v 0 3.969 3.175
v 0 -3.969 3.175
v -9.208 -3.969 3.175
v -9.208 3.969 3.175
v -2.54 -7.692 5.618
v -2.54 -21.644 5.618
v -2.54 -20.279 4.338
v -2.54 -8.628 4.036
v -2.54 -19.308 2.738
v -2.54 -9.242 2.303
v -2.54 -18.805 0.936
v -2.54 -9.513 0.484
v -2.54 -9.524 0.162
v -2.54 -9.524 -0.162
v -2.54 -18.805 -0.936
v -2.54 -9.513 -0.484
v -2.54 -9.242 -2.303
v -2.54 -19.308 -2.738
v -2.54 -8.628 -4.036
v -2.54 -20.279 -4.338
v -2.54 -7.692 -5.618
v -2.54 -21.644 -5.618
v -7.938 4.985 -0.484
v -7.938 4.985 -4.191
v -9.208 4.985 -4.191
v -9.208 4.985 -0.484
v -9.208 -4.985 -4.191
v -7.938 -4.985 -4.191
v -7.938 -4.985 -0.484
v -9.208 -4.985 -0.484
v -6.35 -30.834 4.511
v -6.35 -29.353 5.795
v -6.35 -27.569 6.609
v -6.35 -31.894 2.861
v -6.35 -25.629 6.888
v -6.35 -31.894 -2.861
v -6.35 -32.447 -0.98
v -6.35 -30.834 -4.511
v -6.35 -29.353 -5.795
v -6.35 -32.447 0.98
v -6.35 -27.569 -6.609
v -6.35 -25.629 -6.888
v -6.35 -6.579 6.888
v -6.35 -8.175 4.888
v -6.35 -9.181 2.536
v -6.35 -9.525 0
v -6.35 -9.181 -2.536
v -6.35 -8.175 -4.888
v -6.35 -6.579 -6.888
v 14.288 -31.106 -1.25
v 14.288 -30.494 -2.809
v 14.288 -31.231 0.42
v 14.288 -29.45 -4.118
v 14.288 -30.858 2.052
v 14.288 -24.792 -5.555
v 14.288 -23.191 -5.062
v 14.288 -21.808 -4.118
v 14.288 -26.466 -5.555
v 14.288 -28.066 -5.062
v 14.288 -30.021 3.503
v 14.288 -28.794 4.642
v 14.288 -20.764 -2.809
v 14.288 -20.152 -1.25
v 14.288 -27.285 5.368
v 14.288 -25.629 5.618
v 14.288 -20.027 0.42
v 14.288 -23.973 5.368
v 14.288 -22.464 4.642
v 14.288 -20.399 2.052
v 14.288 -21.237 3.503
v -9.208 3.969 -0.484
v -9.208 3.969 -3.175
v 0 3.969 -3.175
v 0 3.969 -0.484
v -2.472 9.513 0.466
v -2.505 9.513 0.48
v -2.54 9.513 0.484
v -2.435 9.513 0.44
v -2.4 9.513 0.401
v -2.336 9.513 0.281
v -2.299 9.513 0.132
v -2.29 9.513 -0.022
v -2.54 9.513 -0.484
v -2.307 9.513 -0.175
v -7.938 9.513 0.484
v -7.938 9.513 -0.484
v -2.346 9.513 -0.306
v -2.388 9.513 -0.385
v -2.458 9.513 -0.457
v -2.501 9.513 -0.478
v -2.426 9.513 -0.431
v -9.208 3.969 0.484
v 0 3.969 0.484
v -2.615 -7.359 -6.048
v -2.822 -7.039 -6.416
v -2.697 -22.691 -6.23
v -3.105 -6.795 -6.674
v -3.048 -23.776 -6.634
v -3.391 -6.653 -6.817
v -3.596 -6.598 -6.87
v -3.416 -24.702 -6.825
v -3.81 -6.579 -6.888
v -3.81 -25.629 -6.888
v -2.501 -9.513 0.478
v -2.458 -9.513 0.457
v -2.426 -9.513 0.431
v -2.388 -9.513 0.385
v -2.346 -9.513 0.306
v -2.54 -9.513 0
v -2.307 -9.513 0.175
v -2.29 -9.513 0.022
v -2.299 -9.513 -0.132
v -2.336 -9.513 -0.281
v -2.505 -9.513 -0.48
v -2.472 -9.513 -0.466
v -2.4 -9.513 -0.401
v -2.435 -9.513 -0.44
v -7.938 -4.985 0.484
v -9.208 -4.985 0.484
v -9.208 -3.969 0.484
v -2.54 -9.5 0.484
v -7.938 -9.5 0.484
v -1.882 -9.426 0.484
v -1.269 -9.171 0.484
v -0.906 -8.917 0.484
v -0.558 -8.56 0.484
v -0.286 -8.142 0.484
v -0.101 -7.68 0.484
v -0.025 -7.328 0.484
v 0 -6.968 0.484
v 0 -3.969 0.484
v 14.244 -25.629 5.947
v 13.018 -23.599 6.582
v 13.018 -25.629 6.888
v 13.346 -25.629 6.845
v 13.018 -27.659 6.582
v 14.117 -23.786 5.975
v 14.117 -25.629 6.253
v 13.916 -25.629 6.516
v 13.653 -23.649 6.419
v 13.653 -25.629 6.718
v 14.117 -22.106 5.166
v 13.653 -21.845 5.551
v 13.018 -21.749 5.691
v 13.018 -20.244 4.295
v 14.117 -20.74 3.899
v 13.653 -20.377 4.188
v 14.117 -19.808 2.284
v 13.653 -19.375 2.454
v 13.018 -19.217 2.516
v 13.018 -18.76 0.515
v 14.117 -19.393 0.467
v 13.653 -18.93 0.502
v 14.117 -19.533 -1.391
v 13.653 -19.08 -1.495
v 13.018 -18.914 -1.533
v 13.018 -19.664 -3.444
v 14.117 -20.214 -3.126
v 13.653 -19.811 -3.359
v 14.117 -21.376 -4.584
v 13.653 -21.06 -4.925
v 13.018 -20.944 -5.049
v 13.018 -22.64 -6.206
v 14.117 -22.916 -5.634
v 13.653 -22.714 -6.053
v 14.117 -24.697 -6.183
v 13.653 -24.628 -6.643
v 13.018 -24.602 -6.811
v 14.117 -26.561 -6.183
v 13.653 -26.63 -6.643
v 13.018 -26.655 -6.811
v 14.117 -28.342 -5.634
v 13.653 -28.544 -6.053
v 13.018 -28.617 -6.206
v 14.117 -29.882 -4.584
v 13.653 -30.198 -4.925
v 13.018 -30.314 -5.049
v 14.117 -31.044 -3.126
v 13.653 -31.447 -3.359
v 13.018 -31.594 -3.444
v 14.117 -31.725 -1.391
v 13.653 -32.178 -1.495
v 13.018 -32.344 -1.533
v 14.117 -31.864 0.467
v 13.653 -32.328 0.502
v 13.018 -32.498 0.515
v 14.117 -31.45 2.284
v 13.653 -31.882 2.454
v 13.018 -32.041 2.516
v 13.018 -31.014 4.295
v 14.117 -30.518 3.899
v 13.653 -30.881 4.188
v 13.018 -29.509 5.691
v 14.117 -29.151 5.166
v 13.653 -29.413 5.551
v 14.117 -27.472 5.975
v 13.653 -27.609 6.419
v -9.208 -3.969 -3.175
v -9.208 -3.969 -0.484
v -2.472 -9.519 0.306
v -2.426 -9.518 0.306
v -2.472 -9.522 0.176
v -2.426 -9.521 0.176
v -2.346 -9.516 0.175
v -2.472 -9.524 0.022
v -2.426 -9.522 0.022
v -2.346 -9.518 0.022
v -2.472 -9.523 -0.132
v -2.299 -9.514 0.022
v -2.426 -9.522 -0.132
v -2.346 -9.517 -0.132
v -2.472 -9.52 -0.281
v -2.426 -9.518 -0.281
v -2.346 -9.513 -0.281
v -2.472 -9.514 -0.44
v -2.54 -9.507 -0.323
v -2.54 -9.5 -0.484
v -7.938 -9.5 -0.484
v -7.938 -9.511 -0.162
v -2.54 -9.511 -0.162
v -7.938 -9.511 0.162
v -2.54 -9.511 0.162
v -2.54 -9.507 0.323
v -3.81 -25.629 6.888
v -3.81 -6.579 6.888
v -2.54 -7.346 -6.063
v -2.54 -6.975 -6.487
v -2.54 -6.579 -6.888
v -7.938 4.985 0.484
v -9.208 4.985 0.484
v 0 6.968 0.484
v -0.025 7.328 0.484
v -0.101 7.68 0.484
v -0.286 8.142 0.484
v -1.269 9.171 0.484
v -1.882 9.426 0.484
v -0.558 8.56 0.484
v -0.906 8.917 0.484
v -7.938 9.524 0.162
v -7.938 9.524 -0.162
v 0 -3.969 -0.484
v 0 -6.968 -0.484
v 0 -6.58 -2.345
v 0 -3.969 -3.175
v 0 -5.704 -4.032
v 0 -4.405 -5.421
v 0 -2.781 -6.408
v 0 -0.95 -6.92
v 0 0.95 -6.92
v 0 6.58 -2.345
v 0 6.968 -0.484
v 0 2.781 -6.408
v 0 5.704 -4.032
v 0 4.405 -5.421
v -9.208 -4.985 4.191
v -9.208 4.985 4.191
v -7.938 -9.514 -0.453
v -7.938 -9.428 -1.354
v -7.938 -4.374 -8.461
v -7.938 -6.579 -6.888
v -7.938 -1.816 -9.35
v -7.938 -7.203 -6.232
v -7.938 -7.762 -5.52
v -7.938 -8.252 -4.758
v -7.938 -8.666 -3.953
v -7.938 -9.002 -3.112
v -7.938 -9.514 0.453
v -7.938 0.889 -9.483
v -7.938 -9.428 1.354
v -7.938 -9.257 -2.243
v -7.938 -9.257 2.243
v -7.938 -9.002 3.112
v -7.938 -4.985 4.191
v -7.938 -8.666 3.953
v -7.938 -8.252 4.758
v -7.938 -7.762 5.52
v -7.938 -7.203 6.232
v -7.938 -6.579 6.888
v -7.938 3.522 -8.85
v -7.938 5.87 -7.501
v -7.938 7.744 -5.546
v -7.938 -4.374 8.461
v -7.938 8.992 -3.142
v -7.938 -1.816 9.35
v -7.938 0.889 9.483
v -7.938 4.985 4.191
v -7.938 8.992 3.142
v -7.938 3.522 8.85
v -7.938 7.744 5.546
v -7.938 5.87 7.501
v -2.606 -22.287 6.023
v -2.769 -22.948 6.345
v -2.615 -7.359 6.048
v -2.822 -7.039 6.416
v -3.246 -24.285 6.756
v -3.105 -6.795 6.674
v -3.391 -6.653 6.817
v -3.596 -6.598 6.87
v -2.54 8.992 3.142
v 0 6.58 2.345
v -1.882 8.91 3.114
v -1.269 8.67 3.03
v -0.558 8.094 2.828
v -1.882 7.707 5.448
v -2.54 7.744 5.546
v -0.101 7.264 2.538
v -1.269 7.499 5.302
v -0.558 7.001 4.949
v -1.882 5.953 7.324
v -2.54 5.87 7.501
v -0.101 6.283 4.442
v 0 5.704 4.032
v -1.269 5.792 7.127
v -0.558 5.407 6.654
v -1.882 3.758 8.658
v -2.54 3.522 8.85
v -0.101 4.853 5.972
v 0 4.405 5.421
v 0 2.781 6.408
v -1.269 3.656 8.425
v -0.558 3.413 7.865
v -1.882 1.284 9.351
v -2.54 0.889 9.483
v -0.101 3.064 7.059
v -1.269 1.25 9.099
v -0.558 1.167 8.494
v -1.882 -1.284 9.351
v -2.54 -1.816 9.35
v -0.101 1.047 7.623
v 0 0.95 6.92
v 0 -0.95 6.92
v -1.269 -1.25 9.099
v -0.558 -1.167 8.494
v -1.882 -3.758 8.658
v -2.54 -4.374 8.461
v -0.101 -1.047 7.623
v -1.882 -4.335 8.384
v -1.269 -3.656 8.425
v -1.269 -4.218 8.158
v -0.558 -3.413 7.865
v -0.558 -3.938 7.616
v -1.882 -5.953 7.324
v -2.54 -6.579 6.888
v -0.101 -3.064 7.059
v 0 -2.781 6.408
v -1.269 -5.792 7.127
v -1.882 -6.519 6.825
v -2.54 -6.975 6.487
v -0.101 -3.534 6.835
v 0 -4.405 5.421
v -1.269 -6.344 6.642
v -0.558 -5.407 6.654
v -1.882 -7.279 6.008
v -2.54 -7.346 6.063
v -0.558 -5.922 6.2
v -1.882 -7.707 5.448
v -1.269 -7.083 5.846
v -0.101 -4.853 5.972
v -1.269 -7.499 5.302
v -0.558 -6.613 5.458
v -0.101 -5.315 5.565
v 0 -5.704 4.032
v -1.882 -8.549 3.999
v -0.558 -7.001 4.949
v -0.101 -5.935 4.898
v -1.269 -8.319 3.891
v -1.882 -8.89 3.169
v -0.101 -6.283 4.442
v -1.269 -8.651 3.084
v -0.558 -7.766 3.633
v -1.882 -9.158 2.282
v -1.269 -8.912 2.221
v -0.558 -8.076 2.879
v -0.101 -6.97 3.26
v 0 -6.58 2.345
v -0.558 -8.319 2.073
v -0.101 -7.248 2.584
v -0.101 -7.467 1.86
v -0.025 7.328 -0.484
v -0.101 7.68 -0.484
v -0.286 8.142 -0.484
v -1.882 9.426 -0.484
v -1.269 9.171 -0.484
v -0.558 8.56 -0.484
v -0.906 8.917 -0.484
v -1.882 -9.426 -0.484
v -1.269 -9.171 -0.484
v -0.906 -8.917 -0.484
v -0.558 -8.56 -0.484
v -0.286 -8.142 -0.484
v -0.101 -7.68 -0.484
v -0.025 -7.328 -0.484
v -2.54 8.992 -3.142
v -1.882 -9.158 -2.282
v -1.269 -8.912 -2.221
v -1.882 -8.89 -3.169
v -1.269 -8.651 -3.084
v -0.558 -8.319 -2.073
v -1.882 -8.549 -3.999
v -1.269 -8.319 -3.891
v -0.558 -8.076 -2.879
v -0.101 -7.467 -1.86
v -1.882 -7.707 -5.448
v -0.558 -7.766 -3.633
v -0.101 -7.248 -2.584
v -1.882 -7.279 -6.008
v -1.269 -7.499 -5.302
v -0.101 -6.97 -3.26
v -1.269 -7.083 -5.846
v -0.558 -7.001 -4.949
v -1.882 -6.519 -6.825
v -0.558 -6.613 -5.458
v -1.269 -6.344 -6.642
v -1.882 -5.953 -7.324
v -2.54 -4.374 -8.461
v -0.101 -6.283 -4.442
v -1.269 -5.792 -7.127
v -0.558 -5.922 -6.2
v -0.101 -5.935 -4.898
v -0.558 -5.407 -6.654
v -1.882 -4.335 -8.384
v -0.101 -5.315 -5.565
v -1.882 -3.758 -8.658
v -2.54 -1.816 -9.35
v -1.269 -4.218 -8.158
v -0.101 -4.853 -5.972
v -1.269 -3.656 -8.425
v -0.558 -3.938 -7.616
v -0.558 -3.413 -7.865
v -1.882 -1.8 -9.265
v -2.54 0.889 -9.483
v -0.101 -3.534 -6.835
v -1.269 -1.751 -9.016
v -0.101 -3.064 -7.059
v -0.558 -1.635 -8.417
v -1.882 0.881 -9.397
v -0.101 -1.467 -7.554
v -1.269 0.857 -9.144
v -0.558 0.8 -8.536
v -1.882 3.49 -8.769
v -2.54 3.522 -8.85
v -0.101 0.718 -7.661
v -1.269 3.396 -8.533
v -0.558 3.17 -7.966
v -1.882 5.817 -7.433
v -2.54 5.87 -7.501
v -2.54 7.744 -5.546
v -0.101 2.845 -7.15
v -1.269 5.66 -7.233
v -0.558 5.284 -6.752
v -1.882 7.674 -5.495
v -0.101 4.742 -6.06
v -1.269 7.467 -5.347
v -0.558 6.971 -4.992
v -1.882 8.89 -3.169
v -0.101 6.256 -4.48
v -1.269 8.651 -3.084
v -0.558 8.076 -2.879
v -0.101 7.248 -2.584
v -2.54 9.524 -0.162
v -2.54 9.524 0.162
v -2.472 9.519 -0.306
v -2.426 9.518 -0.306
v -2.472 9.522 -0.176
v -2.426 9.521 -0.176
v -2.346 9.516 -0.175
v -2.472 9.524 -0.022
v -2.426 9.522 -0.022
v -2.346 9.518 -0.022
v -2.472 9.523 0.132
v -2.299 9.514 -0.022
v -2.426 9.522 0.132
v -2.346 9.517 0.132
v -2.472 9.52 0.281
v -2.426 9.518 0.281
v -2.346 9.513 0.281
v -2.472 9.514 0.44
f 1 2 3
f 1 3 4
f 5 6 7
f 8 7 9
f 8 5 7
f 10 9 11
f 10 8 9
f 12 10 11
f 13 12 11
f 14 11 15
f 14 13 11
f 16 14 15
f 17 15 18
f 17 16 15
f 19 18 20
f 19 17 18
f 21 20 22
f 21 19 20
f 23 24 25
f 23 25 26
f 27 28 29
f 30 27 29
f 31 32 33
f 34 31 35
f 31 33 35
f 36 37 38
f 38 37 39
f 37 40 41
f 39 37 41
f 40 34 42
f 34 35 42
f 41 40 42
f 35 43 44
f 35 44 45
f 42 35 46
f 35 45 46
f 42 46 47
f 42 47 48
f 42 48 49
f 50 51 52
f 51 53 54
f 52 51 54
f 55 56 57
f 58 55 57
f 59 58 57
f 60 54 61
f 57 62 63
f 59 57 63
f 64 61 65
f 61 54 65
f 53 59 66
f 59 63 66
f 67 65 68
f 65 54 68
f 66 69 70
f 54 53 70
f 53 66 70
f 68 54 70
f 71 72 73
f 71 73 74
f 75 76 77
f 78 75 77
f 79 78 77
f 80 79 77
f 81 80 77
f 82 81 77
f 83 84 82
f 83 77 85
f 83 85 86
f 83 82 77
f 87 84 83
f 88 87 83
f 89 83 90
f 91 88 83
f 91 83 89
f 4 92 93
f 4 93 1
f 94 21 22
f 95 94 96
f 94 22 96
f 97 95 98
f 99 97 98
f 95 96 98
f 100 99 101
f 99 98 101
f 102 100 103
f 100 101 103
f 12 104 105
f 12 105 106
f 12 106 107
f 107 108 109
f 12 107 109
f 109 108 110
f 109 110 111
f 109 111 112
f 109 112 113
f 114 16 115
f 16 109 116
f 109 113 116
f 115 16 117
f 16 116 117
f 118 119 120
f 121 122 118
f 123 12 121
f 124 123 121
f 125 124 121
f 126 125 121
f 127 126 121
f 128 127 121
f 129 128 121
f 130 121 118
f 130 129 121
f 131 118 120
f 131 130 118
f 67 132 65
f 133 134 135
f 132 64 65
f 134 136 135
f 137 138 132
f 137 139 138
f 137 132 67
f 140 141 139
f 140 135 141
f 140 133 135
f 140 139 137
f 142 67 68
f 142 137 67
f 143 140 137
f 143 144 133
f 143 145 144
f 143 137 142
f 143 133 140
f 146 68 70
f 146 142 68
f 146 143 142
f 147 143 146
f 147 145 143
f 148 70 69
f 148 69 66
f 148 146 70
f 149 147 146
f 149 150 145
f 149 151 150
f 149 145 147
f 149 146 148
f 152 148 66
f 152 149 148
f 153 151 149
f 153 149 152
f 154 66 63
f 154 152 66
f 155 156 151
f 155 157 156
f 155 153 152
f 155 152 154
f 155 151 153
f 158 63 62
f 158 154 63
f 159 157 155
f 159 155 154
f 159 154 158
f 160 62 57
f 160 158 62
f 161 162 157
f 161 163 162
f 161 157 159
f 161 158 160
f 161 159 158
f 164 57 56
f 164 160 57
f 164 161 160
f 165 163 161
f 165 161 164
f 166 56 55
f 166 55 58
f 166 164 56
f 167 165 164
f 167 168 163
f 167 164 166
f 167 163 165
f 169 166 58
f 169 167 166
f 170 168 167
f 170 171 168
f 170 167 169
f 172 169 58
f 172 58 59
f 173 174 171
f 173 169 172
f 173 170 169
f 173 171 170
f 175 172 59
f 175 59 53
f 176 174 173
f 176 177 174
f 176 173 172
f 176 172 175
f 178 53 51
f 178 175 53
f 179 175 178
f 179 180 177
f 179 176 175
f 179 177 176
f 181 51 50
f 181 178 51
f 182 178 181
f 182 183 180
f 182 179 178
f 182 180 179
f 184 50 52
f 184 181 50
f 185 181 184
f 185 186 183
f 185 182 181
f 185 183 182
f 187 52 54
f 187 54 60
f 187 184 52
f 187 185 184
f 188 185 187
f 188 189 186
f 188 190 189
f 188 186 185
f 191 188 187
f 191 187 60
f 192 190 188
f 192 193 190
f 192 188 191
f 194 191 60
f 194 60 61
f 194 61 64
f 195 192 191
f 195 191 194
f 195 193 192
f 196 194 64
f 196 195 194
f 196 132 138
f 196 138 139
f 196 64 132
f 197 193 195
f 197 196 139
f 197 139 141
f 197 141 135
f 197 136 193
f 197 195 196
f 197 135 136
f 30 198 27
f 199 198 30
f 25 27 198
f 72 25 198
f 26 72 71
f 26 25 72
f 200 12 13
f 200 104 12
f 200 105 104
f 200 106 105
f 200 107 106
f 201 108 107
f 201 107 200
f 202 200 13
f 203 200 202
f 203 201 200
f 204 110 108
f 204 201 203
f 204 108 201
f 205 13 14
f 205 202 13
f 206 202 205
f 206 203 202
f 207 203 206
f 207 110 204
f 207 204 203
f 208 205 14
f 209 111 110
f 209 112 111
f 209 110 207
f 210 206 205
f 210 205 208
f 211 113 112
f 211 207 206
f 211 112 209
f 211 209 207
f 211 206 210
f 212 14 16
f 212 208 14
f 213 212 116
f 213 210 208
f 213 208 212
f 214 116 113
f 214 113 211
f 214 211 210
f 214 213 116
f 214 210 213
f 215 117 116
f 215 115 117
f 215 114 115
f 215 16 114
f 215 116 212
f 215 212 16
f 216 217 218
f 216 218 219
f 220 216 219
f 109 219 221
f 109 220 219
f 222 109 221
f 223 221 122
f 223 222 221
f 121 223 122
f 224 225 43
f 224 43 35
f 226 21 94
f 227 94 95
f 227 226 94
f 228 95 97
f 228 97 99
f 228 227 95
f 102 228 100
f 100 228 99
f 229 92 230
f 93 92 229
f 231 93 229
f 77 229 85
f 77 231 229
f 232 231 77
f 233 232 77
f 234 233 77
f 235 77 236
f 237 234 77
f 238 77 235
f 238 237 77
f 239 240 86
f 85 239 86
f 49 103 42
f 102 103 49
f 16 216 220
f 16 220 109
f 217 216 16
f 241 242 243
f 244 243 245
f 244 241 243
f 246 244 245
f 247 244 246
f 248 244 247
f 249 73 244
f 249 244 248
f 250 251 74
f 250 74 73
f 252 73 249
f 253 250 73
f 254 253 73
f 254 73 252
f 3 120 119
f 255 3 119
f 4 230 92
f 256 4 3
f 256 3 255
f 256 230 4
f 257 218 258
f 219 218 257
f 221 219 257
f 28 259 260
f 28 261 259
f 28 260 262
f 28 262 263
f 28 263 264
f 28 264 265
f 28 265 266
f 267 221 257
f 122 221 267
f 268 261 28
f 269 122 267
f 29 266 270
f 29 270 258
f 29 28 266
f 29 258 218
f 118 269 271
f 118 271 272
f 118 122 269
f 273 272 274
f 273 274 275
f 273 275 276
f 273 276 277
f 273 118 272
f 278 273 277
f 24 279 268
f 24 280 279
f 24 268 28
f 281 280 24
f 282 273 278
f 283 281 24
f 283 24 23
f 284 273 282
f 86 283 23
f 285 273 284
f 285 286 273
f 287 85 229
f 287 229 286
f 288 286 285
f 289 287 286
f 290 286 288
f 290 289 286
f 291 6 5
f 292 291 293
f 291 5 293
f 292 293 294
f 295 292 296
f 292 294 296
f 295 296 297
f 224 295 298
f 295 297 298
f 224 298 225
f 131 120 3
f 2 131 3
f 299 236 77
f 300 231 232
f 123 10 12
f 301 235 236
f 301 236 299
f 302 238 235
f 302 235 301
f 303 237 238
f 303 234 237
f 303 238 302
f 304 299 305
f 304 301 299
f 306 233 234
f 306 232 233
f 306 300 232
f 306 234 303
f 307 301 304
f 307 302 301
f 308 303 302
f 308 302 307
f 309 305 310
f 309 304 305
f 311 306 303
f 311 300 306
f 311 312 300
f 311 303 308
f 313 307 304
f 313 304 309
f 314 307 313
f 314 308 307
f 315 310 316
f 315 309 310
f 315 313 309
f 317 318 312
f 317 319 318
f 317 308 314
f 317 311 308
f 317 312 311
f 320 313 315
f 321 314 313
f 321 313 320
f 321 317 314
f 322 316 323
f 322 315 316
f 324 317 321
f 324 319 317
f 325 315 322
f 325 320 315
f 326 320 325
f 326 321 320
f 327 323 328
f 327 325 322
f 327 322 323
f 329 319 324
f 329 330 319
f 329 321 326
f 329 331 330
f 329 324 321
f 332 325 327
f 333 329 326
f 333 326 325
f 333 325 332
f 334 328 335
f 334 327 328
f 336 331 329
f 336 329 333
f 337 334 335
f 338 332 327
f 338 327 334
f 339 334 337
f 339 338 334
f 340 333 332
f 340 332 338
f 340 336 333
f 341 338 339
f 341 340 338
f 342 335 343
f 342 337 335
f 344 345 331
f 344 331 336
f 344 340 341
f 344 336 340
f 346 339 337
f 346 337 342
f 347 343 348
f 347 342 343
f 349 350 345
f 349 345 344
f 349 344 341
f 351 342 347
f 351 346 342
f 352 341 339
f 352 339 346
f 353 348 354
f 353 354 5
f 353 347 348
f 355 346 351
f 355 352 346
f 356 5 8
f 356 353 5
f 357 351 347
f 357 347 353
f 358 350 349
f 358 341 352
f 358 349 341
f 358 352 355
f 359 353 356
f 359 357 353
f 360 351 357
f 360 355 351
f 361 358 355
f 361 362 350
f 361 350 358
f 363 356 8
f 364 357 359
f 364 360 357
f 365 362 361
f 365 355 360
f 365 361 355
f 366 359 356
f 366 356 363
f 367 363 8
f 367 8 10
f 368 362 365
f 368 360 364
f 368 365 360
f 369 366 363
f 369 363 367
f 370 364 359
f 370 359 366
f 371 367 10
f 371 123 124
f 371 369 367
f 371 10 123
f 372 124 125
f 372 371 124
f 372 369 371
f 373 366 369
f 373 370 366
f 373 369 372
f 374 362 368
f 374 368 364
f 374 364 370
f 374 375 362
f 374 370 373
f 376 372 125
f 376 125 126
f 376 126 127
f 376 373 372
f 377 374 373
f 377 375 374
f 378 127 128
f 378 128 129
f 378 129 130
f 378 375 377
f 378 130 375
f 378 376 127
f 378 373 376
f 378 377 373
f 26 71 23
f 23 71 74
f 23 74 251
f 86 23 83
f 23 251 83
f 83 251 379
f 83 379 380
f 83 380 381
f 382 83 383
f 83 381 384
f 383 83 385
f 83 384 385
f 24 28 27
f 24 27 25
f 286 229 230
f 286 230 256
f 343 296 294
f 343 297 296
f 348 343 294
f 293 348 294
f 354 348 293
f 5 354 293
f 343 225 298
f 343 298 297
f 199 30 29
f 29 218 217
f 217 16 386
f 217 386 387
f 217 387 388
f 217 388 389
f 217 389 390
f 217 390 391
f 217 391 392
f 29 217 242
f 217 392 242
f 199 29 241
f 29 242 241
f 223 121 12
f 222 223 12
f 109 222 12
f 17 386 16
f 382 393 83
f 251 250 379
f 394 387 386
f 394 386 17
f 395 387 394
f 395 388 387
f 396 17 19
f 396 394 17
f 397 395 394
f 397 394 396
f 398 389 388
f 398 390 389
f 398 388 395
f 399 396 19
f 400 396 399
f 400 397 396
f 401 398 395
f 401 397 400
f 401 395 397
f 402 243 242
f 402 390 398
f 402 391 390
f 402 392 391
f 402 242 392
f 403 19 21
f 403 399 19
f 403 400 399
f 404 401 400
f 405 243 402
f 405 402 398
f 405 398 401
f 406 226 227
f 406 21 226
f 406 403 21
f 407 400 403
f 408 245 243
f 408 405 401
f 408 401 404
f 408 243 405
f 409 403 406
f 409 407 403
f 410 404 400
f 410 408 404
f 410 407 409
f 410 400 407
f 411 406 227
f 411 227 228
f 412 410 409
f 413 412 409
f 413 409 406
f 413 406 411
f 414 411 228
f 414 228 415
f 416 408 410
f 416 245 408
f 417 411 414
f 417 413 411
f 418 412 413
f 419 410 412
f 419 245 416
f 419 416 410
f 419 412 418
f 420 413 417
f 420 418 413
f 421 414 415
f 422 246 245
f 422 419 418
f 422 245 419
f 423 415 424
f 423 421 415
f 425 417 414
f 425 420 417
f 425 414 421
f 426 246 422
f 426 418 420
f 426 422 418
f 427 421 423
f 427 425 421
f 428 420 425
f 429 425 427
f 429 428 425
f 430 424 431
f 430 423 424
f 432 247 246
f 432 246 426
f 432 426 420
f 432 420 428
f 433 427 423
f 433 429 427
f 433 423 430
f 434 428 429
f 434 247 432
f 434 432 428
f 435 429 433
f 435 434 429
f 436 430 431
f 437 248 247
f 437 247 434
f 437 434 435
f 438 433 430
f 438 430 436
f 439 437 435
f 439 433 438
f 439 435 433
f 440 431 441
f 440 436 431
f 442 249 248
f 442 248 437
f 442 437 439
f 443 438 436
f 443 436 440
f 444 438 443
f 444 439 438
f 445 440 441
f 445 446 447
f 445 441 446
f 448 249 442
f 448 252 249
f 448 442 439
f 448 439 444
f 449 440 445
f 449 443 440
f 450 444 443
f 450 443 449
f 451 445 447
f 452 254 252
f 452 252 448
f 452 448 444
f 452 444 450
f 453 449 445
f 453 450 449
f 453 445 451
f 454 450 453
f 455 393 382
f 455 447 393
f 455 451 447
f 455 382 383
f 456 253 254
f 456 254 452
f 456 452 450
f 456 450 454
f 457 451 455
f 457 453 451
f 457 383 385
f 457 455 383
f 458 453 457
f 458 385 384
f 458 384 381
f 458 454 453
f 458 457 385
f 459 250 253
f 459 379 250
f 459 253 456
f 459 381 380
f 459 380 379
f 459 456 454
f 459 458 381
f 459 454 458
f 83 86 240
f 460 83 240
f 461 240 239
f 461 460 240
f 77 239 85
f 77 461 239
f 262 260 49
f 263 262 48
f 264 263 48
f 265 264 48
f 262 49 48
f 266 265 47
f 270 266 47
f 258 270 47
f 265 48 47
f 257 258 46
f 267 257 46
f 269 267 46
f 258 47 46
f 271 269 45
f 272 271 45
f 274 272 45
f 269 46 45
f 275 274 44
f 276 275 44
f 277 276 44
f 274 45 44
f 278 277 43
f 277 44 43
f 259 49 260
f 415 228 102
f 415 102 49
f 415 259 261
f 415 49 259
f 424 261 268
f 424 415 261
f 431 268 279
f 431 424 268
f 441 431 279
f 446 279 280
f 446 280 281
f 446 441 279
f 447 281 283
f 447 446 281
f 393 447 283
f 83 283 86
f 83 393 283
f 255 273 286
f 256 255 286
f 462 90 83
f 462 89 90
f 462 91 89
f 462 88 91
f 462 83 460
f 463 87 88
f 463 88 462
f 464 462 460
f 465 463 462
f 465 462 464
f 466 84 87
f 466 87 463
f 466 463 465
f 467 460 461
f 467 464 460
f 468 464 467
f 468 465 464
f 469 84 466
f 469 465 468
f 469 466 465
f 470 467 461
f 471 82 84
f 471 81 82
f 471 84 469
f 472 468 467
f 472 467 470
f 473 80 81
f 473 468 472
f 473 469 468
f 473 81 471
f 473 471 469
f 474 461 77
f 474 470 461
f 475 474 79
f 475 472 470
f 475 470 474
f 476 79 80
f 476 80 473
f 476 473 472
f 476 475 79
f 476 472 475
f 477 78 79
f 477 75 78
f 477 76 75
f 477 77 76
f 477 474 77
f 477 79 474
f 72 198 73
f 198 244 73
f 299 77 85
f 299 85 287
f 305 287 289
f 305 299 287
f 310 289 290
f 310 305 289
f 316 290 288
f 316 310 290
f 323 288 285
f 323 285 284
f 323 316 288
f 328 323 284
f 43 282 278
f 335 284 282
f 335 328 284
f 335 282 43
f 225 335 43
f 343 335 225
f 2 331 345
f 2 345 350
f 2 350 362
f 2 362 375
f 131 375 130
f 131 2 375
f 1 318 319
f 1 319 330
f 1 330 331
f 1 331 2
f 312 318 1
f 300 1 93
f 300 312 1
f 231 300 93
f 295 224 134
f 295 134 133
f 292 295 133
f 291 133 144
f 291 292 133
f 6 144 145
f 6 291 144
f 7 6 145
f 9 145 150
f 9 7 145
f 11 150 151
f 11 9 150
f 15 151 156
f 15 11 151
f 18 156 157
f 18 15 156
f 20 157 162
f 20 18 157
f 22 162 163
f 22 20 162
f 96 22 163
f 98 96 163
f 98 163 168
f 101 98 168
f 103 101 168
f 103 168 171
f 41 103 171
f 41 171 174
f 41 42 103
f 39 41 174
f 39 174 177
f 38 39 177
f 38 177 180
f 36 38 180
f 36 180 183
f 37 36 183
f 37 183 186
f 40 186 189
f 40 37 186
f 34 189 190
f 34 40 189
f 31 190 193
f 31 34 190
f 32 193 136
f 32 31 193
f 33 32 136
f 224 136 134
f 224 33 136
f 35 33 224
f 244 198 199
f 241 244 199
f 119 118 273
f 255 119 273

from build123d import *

# Parameters (mm, degrees)
SKETCH1_R            = 9.525
BOSS_EXTRUDE1_DEPTH  = 7.9375
FILLET1_R            = 2.54
SKETCH4_W            = 0.968946332
SKETCH4_H            = 19.025342126
CUT_EXTRUDE1_DEPTH   = 16.63506176
SKETCH6_W            = 6.35
SKETCH6_H            = 7.9375
CUT_EXTRUDE2_DEPTH   = 16.635061933
BOSS_EXTRUDE10_DEPTH = 5.3975
SKETCH11_R           = 6.887956427
BOSS_EXTRUDE12_DEPTH = 22.225
FILLET2_R            = 1.27
CUT_EXTRUDE3_START   = -1.5875
CUT_EXTRUDE3_DEPTH   = 1.5875
SKETCH13_W           = 8.382
SKETCH13_H           = 9.9695
SKETCH13_W_2         = 6.35
SKETCH13_H_2         = 7.9375
EXTRUDE_THIN1_DEPTH  = 1.27
SKETCH14_W           = 0.968946332
SKETCH14_H           = 9.9695
CUT_EXTRUDE4_DEPTH   = 37.77231348


with BuildPart() as part:
    # Sketch1 → Boss-Extrude1 (new body)
    with BuildSketch(Plane(origin=(0, 0, 0), x_dir=(0, 0, -1), z_dir=(1, 0, 0))):
        Circle(SKETCH1_R)
    extrude(amount=-BOSS_EXTRUDE1_DEPTH)

    # Fillet1
    fillet1_edges = [part.edges().sort_by_distance(p)[0] for p in [
        (0, 0, 9.525),
    ]]
    fillet(fillet1_edges, radius=FILLET1_R)

    # Sketch4 → Cut-Extrude1 (cut, through all)
    with BuildSketch(Plane(origin=(0, 0, 0), x_dir=(0, 0, -1), z_dir=(1, 0, 0))):
        Rectangle(SKETCH4_W, SKETCH4_H)
    extrude(amount=-CUT_EXTRUDE1_DEPTH, mode=Mode.SUBTRACT)

    # Sketch6 → Cut-Extrude2 (cut, through all)
    with BuildSketch(Plane(origin=(0, 0, 0), x_dir=(0, 0, -1), z_dir=(1, 0, 0))):
        Rectangle(SKETCH6_W, SKETCH6_H)
    extrude(amount=-CUT_EXTRUDE2_DEPTH, mode=Mode.SUBTRACT)

    # Sketch8 → Boss-Extrude10 (add)
    with BuildSketch(Plane(origin=(-2.54, 0, 0), x_dir=(0, 0, -1), z_dir=(1, 0, 0))):
        with BuildLine():
            Line((-6.887956427, -6.578881459), (-6.887956427, -25.628881459))
            Line((-6.887956427, -25.628881459), (6.887956427, -25.628881459))
            Line((6.887956427, -25.628881459), (6.887956427, -6.578881459))
            ThreePointArc((6.887956427, -6.578881459), (0, -9.512671063), (-6.887956427, -6.578881459))
        make_face()
    extrude(amount=-BOSS_EXTRUDE10_DEPTH)

    # Sketch11 → Boss-Extrude12 (add)
    with BuildSketch(Plane.ZY.offset(7.9375)):
        with Locations((0, -25.628881459)):
            Circle(SKETCH11_R)
    extrude(amount=-BOSS_EXTRUDE12_DEPTH)

    # Fillet2
    # the kernel refuses this fillet: 1.27 mm, written as the material it takes off along each edge
    with BuildSketch(Plane(origin=(14.2875, -25.628881459, 0), x_dir=(0, 0, 1), z_dir=(0, -1, 0))) as fillet2_piece_1:
        with BuildLine():
            CenterArc((6.887956427 - FILLET2_R, FILLET2_R), FILLET2_R, 270, 90)
            Line((6.887956427 - FILLET2_R, 0), (6.887956427, 0))
            Line((6.887956427, 0), (6.887956427, FILLET2_R))
        make_face()
    revolve(axis=Axis((14.2875, -25.628881459, 0), (-1, 0, 0)), mode=Mode.SUBTRACT)
    with BuildSketch(Plane(origin=(-2.54, -3.403881459, 6.887956427), x_dir=(-1, 0, 0), z_dir=(0, -1, 0))) as fillet2_piece_2_section:
        with BuildLine():
            CenterArc((FILLET2_R, FILLET2_R), FILLET2_R, 180, 90)
            Line((0, FILLET2_R), (0, 0))
            Line((0, 0), (FILLET2_R, 0))
        make_face()
    fillet2_piece_2 = extrude(amount=25.4, mode=Mode.PRIVATE)
    fillet2_piece_2 = fillet2_piece_2 - Plane(origin=(-2.832756395, 0, 0), x_dir=(0, 0, -1), z_dir=(1, 0, 0)) * Cylinder(9.525, 56, mode=Mode.PRIVATE)
    fillet2_piece_2 = fillet2_piece_2 - Plane(origin=(-2.832756395, -25.628881459, 0), x_dir=(0, 0, 1), z_dir=(-1, 0, 0)) * Cylinder(6.887956427, 56, mode=Mode.PRIVATE)
    add(fillet2_piece_2, mode=Mode.SUBTRACT)
    with BuildSketch(Plane(origin=(-2.54, -28.803881459, -6.887956427), x_dir=(-1, 0, 0), z_dir=(0, 1, 0))) as fillet2_piece_3_section:
        with BuildLine():
            CenterArc((FILLET2_R, FILLET2_R), FILLET2_R, 180, 90)
            Line((0, FILLET2_R), (0, 0))
            Line((0, 0), (FILLET2_R, 0))
        make_face()
    fillet2_piece_3 = extrude(amount=25.4, mode=Mode.PRIVATE)
    fillet2_piece_3 = fillet2_piece_3 - Plane(origin=(-2.83275673, 0, 0), x_dir=(0, 0, -1), z_dir=(1, 0, 0)) * Cylinder(9.525, 56, mode=Mode.PRIVATE)
    fillet2_piece_3 = fillet2_piece_3 - Plane(origin=(-2.83275673, -25.628881459, 0), x_dir=(0, 0, 1), z_dir=(-1, 0, 0)) * Cylinder(6.887956427, 56, mode=Mode.PRIVATE)
    add(fillet2_piece_3, mode=Mode.SUBTRACT)

    # Sketch12 → Cut-Extrude3 (cut)
    with BuildSketch(Plane.ZY.offset(7.9375).offset(CUT_EXTRUDE3_START)):
        with BuildLine():
            Line((-6.887956427, -25.628881459), (-6.887956427, -6.578881459))
            ThreePointArc((-6.887956427, -6.578881459), (0, -9.525), (6.887956427, -6.578881459))
            Line((6.887956427, -6.578881459), (6.887956427, -25.628881459))
            ThreePointArc((6.887956427, -25.628881459), (0, -32.516837887), (-6.887956427, -25.628881459))
        make_face()
    extrude(amount=CUT_EXTRUDE3_DEPTH, mode=Mode.SUBTRACT)

    # Sketch13 → Extrude-Thin1 (add)
    with BuildSketch(Plane.ZY.offset(7.9375)):
        Rectangle(SKETCH13_W, SKETCH13_H)
        Rectangle(SKETCH13_W_2, SKETCH13_H_2, mode=Mode.SUBTRACT)
    extrude(amount=EXTRUDE_THIN1_DEPTH)

    # Sketch14 → Cut-Extrude4 (cut, through all)
    with BuildSketch(Plane(origin=(0, 0, 0), x_dir=(0, 0, -1), z_dir=(1, 0, 0))):
        Rectangle(SKETCH14_W, SKETCH14_H)
    extrude(amount=-CUT_EXTRUDE4_DEPTH, mode=Mode.SUBTRACT)


solid = part.part
